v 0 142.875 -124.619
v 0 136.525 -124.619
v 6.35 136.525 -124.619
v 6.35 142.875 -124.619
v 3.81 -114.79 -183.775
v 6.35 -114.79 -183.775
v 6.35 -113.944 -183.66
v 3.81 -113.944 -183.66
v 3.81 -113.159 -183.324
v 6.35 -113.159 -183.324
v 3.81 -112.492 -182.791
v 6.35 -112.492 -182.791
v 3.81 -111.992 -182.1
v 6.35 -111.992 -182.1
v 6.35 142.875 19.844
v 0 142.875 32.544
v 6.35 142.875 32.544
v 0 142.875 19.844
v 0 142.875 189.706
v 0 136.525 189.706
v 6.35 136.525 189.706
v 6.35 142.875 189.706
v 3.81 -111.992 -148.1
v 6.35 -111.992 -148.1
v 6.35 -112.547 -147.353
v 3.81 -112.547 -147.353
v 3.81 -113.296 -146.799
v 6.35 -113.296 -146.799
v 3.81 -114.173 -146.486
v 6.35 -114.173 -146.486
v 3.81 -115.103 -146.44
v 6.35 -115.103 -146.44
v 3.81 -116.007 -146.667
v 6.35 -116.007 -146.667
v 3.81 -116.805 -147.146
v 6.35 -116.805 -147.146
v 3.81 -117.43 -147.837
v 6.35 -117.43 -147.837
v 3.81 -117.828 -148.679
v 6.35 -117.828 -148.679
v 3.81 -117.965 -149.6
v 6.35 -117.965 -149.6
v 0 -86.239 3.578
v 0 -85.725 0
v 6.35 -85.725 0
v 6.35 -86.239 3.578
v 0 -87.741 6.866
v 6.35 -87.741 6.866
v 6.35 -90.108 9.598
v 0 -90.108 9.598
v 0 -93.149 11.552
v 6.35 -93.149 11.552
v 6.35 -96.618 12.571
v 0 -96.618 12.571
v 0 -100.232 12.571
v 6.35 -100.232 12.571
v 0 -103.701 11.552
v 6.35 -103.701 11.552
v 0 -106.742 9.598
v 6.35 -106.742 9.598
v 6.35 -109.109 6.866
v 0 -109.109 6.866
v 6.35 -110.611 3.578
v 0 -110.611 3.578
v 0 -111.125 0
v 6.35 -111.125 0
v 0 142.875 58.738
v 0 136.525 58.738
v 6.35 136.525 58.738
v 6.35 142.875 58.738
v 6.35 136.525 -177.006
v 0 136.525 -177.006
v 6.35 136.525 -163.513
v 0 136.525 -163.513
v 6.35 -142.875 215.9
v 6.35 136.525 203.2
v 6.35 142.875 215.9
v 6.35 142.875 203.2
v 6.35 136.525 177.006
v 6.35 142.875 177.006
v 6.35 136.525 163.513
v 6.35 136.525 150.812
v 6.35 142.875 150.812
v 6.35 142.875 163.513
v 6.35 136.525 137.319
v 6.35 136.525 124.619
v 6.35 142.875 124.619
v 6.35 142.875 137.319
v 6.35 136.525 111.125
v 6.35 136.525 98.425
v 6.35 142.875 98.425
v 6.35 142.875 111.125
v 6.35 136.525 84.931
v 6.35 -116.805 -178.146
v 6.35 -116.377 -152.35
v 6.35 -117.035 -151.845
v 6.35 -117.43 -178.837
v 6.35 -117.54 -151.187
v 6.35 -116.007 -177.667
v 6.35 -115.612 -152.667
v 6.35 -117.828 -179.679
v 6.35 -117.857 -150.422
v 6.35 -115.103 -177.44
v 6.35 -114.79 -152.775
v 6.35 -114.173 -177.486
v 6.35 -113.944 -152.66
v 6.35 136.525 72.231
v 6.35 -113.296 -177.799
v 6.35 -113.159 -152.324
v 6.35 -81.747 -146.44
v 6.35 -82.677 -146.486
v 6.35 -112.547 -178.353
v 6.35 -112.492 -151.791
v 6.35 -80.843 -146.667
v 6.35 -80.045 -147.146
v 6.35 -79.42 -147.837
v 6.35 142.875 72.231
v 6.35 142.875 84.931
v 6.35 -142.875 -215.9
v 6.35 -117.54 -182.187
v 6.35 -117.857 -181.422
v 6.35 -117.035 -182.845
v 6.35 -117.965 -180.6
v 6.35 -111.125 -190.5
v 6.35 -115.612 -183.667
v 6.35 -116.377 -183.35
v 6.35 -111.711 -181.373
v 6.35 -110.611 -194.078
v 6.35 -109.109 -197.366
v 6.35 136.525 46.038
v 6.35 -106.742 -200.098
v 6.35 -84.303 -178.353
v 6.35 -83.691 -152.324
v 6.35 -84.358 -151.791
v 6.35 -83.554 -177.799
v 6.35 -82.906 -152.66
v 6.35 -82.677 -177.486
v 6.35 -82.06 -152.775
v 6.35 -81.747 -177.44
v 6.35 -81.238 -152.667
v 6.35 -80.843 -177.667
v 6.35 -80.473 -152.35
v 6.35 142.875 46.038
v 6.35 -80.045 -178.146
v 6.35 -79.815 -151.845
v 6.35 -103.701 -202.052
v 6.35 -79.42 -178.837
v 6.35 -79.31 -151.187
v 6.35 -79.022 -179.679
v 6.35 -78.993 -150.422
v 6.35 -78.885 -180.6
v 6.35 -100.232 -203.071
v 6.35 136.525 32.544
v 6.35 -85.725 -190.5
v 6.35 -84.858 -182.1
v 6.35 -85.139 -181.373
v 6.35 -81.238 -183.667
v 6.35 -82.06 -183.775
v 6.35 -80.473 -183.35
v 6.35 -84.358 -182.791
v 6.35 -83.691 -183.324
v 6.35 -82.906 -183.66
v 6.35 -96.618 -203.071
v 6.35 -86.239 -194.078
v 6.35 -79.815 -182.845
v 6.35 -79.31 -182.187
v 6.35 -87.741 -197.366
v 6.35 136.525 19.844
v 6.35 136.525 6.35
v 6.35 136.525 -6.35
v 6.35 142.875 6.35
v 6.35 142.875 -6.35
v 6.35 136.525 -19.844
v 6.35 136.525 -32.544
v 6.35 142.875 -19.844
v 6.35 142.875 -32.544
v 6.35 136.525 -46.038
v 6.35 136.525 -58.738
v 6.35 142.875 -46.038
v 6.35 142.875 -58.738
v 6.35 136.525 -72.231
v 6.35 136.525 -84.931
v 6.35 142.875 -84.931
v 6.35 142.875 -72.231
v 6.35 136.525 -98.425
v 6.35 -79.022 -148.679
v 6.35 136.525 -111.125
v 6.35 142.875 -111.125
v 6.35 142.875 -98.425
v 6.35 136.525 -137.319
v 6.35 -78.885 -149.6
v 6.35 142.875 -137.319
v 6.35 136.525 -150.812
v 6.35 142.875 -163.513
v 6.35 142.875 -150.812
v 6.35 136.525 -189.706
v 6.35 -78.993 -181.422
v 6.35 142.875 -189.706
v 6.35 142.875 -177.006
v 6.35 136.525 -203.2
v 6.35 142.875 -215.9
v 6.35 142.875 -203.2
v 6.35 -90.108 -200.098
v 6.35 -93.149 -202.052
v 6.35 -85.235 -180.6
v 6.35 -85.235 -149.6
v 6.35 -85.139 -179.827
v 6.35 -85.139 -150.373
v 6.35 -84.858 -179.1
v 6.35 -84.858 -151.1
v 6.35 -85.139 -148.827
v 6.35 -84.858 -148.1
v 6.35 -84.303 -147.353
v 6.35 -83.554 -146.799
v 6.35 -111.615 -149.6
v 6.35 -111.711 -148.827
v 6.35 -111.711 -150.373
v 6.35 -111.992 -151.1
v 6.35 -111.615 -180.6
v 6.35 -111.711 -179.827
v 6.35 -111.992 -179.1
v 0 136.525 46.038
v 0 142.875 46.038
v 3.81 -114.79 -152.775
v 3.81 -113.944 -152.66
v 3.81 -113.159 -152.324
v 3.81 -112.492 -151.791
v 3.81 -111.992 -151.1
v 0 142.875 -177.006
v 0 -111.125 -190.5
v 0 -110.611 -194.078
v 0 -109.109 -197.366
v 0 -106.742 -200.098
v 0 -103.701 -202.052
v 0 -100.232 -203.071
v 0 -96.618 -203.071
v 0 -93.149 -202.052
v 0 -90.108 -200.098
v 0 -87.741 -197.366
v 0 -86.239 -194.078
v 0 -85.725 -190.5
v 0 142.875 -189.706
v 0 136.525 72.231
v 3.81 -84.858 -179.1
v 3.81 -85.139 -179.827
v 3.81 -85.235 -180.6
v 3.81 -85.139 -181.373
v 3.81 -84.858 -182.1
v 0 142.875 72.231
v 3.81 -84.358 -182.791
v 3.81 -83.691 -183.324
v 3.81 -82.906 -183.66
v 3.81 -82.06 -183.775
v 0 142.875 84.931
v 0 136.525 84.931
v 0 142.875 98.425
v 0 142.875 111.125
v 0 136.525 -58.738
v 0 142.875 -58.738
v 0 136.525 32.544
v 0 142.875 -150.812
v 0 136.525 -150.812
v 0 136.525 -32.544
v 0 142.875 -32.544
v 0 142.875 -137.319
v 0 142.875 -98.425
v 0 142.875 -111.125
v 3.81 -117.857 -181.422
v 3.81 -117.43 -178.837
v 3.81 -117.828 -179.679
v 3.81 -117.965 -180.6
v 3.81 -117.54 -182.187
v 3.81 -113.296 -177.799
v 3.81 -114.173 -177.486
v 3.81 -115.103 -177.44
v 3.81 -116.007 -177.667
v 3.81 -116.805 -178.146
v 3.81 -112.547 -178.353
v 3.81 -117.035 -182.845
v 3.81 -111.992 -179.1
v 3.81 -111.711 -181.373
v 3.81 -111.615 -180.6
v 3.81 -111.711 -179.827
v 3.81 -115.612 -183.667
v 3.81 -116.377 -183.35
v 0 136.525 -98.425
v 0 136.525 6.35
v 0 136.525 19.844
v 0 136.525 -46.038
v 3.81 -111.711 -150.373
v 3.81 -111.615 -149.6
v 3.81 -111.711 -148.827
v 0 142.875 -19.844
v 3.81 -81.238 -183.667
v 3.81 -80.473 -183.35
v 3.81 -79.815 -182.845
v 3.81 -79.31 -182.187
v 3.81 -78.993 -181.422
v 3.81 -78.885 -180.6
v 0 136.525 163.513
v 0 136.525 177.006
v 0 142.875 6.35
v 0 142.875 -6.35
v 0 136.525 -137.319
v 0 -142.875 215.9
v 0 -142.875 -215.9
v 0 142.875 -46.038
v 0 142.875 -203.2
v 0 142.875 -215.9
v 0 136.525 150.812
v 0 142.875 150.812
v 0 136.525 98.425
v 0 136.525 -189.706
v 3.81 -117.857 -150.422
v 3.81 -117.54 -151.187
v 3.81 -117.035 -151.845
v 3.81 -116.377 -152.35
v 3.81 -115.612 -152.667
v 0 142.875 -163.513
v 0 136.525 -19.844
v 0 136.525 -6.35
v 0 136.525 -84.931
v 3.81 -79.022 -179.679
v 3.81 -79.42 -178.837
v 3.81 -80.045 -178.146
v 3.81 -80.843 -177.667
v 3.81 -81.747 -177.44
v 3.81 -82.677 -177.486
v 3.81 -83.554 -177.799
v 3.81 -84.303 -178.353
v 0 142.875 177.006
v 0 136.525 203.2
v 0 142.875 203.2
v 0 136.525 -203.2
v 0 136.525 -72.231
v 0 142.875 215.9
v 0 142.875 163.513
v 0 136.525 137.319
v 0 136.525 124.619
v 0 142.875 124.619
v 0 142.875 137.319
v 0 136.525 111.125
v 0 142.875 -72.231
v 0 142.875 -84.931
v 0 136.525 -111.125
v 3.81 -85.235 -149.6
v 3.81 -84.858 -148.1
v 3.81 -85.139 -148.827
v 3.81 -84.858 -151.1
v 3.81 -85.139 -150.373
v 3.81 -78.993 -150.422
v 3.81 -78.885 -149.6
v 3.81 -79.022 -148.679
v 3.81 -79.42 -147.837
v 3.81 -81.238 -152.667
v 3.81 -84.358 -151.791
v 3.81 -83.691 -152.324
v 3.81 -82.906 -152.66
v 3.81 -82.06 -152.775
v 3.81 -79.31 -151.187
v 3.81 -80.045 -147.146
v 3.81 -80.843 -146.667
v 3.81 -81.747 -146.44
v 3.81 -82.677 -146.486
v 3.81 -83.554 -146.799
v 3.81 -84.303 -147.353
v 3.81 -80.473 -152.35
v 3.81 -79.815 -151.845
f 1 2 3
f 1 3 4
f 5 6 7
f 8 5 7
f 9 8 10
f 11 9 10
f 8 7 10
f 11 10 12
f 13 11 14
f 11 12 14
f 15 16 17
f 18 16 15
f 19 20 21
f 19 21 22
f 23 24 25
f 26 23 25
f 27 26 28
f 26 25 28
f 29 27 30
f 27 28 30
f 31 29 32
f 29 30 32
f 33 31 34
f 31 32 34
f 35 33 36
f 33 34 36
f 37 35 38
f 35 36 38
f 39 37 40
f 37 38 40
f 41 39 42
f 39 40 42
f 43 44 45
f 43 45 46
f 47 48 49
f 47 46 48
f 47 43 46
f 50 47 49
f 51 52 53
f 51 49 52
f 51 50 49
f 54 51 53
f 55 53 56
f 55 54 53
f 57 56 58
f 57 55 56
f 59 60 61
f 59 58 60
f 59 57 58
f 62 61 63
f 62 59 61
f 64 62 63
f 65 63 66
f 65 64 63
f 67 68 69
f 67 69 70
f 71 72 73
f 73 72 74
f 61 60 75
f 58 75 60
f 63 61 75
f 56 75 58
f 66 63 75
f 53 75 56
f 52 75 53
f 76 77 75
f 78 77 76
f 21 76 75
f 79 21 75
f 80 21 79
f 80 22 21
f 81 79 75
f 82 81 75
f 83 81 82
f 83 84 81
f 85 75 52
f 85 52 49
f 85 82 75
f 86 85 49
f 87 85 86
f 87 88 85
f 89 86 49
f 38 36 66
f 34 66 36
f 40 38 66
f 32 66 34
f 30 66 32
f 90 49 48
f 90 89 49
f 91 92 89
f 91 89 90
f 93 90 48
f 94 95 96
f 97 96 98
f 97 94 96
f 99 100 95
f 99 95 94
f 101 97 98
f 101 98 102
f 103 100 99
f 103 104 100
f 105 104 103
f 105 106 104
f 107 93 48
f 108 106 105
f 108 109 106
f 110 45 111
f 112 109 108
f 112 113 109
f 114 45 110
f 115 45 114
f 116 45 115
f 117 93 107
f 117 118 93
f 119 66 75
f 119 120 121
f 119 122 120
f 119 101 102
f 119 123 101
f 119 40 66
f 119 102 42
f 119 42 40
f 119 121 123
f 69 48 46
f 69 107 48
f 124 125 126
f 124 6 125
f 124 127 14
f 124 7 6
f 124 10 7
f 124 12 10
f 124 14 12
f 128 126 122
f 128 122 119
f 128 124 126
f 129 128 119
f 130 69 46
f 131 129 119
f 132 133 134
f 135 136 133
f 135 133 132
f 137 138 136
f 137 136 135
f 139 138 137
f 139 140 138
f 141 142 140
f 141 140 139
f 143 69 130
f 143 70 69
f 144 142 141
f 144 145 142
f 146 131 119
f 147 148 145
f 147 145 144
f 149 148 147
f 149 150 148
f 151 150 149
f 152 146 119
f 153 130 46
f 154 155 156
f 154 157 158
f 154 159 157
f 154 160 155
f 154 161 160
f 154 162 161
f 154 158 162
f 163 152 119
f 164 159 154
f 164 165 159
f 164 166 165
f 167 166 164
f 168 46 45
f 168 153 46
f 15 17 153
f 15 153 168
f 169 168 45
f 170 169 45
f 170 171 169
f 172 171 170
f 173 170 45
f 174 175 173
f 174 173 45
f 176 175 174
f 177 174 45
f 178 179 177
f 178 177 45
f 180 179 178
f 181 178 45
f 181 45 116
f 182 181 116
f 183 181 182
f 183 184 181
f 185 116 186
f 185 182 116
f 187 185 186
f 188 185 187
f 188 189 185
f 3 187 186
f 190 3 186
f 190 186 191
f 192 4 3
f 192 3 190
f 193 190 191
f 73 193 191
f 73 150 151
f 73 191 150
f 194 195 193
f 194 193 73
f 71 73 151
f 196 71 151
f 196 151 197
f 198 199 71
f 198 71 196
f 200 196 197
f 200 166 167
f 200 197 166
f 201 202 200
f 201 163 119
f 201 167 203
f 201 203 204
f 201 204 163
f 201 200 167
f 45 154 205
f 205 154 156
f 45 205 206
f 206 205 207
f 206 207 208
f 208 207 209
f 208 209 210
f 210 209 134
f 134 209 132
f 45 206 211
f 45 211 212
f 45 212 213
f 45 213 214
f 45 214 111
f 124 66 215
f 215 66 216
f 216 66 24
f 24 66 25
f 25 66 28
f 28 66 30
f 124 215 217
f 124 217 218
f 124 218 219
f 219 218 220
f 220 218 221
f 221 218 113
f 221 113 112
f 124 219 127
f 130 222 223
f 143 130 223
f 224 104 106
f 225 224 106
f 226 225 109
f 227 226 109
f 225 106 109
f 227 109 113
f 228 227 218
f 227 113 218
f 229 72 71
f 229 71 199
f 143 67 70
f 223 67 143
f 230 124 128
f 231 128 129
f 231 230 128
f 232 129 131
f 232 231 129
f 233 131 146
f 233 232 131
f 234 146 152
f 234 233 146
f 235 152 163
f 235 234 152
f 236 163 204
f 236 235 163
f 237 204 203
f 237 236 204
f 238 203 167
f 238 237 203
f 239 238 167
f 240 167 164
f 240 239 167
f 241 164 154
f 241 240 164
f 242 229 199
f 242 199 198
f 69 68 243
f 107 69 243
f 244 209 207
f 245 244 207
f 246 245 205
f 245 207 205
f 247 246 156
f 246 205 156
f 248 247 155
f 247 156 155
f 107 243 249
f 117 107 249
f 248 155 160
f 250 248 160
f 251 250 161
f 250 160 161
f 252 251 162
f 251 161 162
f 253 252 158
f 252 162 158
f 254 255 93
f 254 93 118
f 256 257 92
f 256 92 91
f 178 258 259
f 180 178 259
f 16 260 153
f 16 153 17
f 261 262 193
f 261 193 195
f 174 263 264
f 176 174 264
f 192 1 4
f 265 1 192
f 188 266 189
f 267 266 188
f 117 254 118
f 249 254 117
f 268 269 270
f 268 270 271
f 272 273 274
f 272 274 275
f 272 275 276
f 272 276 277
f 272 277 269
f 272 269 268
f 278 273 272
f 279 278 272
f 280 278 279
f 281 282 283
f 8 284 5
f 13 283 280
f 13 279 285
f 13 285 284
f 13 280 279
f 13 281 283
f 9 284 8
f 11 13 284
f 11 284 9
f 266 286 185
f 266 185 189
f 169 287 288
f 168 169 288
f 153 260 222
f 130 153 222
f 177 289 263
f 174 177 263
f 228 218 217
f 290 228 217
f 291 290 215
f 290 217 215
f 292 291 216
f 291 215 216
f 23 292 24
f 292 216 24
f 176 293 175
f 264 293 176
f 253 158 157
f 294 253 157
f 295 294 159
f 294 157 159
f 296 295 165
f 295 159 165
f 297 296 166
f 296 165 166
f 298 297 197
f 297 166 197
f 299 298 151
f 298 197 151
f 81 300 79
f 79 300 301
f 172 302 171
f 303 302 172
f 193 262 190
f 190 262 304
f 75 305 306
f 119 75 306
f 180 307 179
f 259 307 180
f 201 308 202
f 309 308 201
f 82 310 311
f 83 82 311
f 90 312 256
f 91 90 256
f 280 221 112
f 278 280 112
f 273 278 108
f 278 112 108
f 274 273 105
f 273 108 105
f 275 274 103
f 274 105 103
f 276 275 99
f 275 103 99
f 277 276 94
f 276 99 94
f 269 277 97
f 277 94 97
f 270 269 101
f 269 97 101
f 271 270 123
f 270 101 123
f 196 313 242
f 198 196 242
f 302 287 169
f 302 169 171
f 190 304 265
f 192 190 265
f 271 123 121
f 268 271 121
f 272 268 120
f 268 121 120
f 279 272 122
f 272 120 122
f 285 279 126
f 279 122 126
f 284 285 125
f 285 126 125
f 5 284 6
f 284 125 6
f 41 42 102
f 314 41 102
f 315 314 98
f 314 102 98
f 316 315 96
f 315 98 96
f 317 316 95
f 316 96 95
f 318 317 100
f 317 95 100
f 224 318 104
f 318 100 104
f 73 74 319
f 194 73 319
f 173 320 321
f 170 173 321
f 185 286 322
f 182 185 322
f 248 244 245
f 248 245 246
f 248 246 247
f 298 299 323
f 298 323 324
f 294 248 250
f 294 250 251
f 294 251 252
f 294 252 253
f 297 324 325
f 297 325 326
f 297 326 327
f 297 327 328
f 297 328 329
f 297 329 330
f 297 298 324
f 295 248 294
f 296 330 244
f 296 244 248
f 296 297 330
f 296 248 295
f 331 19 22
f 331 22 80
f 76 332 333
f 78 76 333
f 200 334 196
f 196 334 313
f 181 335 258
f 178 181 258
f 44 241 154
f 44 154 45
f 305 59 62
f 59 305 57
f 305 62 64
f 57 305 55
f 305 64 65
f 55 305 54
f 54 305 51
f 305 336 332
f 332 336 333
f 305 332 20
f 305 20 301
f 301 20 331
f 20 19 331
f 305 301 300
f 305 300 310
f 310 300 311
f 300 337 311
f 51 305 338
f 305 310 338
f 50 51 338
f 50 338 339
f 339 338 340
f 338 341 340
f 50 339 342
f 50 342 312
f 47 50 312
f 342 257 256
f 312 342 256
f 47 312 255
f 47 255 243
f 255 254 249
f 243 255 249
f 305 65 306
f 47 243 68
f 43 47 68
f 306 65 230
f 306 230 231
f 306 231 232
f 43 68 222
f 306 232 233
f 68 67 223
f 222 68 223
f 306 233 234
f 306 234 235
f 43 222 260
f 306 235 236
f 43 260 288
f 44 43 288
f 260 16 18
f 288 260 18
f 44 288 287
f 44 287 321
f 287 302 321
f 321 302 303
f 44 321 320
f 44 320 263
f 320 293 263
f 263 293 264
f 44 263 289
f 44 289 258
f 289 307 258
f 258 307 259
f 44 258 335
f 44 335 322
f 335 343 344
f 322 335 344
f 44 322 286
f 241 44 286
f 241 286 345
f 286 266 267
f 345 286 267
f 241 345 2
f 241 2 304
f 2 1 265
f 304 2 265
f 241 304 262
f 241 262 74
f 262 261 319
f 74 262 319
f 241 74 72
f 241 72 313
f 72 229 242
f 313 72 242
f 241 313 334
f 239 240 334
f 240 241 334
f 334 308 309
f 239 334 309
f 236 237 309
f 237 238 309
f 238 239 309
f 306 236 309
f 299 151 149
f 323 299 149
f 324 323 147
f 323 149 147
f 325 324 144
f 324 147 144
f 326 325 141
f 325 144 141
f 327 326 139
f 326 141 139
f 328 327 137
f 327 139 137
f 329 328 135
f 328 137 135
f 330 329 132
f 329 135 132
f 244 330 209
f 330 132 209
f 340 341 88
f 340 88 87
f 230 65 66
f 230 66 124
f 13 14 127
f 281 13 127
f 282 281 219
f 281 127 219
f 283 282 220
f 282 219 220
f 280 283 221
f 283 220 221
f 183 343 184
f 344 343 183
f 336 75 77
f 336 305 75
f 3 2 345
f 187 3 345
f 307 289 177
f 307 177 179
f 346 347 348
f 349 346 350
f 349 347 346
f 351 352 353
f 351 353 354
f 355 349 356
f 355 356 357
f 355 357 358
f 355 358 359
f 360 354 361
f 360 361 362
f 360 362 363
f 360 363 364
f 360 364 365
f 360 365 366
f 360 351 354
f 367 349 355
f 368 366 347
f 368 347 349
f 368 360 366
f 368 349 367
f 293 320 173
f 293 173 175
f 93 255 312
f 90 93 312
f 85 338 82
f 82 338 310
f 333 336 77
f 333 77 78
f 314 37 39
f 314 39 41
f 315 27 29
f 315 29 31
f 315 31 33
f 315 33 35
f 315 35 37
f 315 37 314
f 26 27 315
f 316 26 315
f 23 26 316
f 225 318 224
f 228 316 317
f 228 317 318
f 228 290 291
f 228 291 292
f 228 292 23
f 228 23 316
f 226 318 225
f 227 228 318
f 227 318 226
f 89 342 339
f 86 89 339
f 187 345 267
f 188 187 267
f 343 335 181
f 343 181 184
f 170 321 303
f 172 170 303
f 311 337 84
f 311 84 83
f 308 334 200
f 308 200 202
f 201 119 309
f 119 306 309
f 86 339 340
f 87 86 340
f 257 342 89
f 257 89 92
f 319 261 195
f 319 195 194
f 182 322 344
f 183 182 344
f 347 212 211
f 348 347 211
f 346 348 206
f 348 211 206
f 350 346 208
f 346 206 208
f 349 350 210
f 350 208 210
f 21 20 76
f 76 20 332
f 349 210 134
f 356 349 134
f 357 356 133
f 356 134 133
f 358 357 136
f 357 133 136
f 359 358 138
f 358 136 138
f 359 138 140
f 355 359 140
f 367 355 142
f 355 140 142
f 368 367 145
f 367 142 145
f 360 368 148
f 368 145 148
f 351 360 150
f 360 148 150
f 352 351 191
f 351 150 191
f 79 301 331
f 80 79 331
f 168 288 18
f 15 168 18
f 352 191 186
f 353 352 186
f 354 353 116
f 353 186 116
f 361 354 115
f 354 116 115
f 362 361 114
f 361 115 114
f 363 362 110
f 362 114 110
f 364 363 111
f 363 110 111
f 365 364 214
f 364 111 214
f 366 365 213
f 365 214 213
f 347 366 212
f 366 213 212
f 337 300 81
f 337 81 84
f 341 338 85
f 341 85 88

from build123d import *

# Parameters (mm, degrees)
SKETCH1_W           = 431.8
SKETCH1_H           = 285.75
BOSS_EXTRUDE1_DEPTH = 6.35
SKETCH2_W           = 431.8
SKETCH2_H           = 6.35
BOSS_EXTRUDE2_DEPTH = 12.7
CUT_EXTRUDE1_DEPTH  = 20.05
SKETCH5_W           = 51.415141408
SKETCH5_H           = 21.159166417
CUT_EXTRUDE2_DEPTH  = 432.8
SKETCH4_W           = 13.49375
SKETCH4_H           = 6.35
CUT_EXTRUDE3_DEPTH  = 6.35
CUT_EXTRUDE5_DEPTH  = 2.54


with BuildPart() as part:
    # Sketch1 → Boss-Extrude1 (new body)
    with BuildSketch(Plane(origin=(0, 0, 0), x_dir=(0, 0, -1), z_dir=(1, 0, 0))):
        Rectangle(SKETCH1_W, SKETCH1_H)
    extrude(amount=BOSS_EXTRUDE1_DEPTH)

    # Sketch2 → Boss-Extrude2 (add)
    with BuildSketch(Plane(origin=(6.35, 0, 0), x_dir=(0, 0, -1), z_dir=(1, 0, 0))):
        with Locations((0, 139.7)):
            Rectangle(SKETCH2_W, SKETCH2_H)
    extrude(amount=BOSS_EXTRUDE2_DEPTH)

    # Sketch3 → Cut-Extrude1 (cut, through all)
    with BuildSketch(Plane.ZY):
        with BuildLine():
            Line((-190.5, -85.725), (0, -85.725))
            ThreePointArc((0, -85.725), (12.7, -98.425), (0, -111.125))
            Line((0, -111.125), (-190.5, -111.125))
            ThreePointArc((-190.5, -111.125), (-203.2, -98.425), (-190.5, -85.725))
        make_face()
    extrude(amount=-CUT_EXTRUDE1_DEPTH, mode=Mode.SUBTRACT)

    # Sketch5 → Cut-Extrude2 (cut, through all)
    with BuildSketch(Plane(origin=(0, 0, -215.9), x_dir=(-1, 0, 0), z_dir=(0, 0, -1))):
        with Locations((-32.057570704, 147.104583209)):
            Rectangle(SKETCH5_W, SKETCH5_H)
    extrude(amount=-CUT_EXTRUDE2_DEPTH, mode=Mode.SUBTRACT)

    # Sketch4 → Cut-Extrude3 (cut)
    with BuildSketch(Plane.ZY):
        with Locations((-196.453125, 139.7)):
            Rectangle(SKETCH4_W, SKETCH4_H)
        with Locations((-170.259375, 139.7)):
            Rectangle(SKETCH4_W, SKETCH4_H)
        with Locations((-144.065625, 139.7)):
            Rectangle(SKETCH4_W, SKETCH4_H)
        with Locations((-117.871875, 139.7)):
            Rectangle(SKETCH4_W, SKETCH4_H)
        with Locations((-91.678125, 139.7)):
            Rectangle(SKETCH4_W, SKETCH4_H)
        with Locations((-65.484375, 139.7)):
            Rectangle(SKETCH4_W, SKETCH4_H)
        with Locations((-39.290625, 139.7)):
            Rectangle(SKETCH4_W, SKETCH4_H)
        with Locations((-13.096875, 139.7)):
            Rectangle(SKETCH4_W, SKETCH4_H)
        with Locations((13.096875, 139.7)):
            Rectangle(SKETCH4_W, SKETCH4_H)
        with Locations((39.290625, 139.7)):
            Rectangle(SKETCH4_W, SKETCH4_H)
        with Locations((65.484375, 139.7)):
            Rectangle(SKETCH4_W, SKETCH4_H)
        with Locations((91.678125, 139.7)):
            Rectangle(SKETCH4_W, SKETCH4_H)
        with Locations((117.871875, 139.7)):
            Rectangle(SKETCH4_W, SKETCH4_H)
        with Locations((144.065625, 139.7)):
            Rectangle(SKETCH4_W, SKETCH4_H)
        with Locations((170.259375, 139.7)):
            Rectangle(SKETCH4_W, SKETCH4_H)
        with Locations((196.453125, 139.7)):
            Rectangle(SKETCH4_W, SKETCH4_H)
    extrude(amount=-CUT_EXTRUDE3_DEPTH, mode=Mode.SUBTRACT)

    # Sketch6 → Cut-Extrude5 (cut)
    with BuildSketch(Plane(origin=(6.35, 0, 0), x_dir=(0, 0, -1), z_dir=(1, 0, 0))):
        with BuildLine():
            ThreePointArc((152.775, -82.06), (151.84506403, -79.81493597), (149.6, -78.885))
            ThreePointArc((149.6, -78.885), (150.660660172, -79.324339828), (151.1, -80.385))
            Line((151.1, -80.385), (151.1, -84.858325392))
            ThreePointArc((151.1, -84.858325392), (152.324254485, -83.690663209), (152.775, -82.06))
        make_face()
        with BuildLine():
            Line((148.1, -80.385), (148.1, -84.858325392))
            ThreePointArc((148.1, -84.858325392), (149.6, -85.235), (151.1, -84.858325392))
            Line((151.1, -84.858325392), (151.1, -80.385))
            ThreePointArc((151.1, -80.385), (150.660660172, -79.324339828), (149.6, -78.885))
            ThreePointArc((149.6, -78.885), (148.539339828, -79.324339828), (148.1, -80.385))
        make_face()
        with BuildLine():
            ThreePointArc((149.6, -78.885), (146.520608167, -81.286714193), (148.1, -84.858325392))
            Line((148.1, -84.858325392), (148.1, -80.385))
            ThreePointArc((148.1, -80.385), (148.539339828, -79.324339828), (149.6, -78.885))
        make_face()
        with BuildLine():
            Line((179.1, -80.385), (179.1, -84.858325392))
            ThreePointArc((179.1, -84.858325392), (180.6, -85.235), (182.1, -84.858325392))
            Line((182.1, -84.858325392), (182.1, -80.385))
            ThreePointArc((182.1, -80.385), (181.660660172, -79.324339828), (180.6, -78.885))
            ThreePointArc((180.6, -78.885), (179.539339828, -79.324339828), (179.1, -80.385))
        make_face()
        with BuildLine():
            ThreePointArc((180.6, -78.885), (177.520608167, -81.286714193), (179.1, -84.858325392))
            Line((179.1, -84.858325392), (179.1, -80.385))
            ThreePointArc((179.1, -80.385), (179.539339828, -79.324339828), (180.6, -78.885))
        make_face()
        with BuildLine():
            ThreePointArc((183.775, -82.06), (182.84506403, -79.81493597), (180.6, -78.885))
            ThreePointArc((180.6, -78.885), (181.660660172, -79.324339828), (182.1, -80.385))
            Line((182.1, -80.385), (182.1, -84.858325392))
            ThreePointArc((182.1, -84.858325392), (183.324254485, -83.690663209), (183.775, -82.06))
        make_face()
        with BuildLine():
            ThreePointArc((151.1, -116.465), (150.660660172, -117.525660172), (149.6, -117.965))
            ThreePointArc((149.6, -117.965), (151.84506403, -117.03506403), (152.775, -114.79))
            ThreePointArc((152.775, -114.79), (152.324254485, -113.159336791), (151.1, -111.991674608))
            Line((151.1, -111.991674608), (151.1, -116.465))
        make_face()
        with BuildLine():
            Line((148.1, -111.991674608), (148.1, -116.465))
            ThreePointArc((148.1, -116.465), (148.539339828, -117.525660172), (149.6, -117.965))
            ThreePointArc((149.6, -117.965), (150.660660172, -117.525660172), (151.1, -116.465))
            Line((151.1, -116.465), (151.1, -111.991674608))
            ThreePointArc((151.1, -111.991674608), (149.6, -111.615), (148.1, -111.991674608))
        make_face()
        with BuildLine():
            ThreePointArc((149.6, -117.965), (148.539339828, -117.525660172), (148.1, -116.465))
            Line((148.1, -116.465), (148.1, -111.991674608))
            ThreePointArc((148.1, -111.991674608), (146.520608167, -115.563285807), (149.6, -117.965))
        make_face()
        with BuildLine():
            ThreePointArc((180.6, -117.965), (181.660660172, -117.525660172), (182.1, -116.465))
            Line((182.1, -116.465), (182.1, -111.991674608))
            ThreePointArc((182.1, -111.991674608), (180.6, -111.615), (179.1, -111.991674608))
            Line((179.1, -111.991674608), (179.1, -116.465))
            ThreePointArc((179.1, -116.465), (179.539339828, -117.525660172), (180.6, -117.965))
        make_face()
        with BuildLine():
            Line((182.1, -111.991674608), (182.1, -116.465))
            ThreePointArc((182.1, -116.465), (181.660660172, -117.525660172), (180.6, -117.965))
            ThreePointArc((180.6, -117.965), (182.84506403, -117.03506403), (183.775, -114.79))
            ThreePointArc((183.775, -114.79), (183.324254485, -113.159336791), (182.1, -111.991674608))
        make_face()
        with BuildLine():
            ThreePointArc((179.1, -111.991674608), (177.520608167, -115.563285807), (180.6, -117.965))
            ThreePointArc((180.6, -117.965), (179.539339828, -117.525660172), (179.1, -116.465))
            Line((179.1, -116.465), (179.1, -111.991674608))
        make_face()
    extrude(amount=-CUT_EXTRUDE5_DEPTH, mode=Mode.SUBTRACT)


solid = part.part
